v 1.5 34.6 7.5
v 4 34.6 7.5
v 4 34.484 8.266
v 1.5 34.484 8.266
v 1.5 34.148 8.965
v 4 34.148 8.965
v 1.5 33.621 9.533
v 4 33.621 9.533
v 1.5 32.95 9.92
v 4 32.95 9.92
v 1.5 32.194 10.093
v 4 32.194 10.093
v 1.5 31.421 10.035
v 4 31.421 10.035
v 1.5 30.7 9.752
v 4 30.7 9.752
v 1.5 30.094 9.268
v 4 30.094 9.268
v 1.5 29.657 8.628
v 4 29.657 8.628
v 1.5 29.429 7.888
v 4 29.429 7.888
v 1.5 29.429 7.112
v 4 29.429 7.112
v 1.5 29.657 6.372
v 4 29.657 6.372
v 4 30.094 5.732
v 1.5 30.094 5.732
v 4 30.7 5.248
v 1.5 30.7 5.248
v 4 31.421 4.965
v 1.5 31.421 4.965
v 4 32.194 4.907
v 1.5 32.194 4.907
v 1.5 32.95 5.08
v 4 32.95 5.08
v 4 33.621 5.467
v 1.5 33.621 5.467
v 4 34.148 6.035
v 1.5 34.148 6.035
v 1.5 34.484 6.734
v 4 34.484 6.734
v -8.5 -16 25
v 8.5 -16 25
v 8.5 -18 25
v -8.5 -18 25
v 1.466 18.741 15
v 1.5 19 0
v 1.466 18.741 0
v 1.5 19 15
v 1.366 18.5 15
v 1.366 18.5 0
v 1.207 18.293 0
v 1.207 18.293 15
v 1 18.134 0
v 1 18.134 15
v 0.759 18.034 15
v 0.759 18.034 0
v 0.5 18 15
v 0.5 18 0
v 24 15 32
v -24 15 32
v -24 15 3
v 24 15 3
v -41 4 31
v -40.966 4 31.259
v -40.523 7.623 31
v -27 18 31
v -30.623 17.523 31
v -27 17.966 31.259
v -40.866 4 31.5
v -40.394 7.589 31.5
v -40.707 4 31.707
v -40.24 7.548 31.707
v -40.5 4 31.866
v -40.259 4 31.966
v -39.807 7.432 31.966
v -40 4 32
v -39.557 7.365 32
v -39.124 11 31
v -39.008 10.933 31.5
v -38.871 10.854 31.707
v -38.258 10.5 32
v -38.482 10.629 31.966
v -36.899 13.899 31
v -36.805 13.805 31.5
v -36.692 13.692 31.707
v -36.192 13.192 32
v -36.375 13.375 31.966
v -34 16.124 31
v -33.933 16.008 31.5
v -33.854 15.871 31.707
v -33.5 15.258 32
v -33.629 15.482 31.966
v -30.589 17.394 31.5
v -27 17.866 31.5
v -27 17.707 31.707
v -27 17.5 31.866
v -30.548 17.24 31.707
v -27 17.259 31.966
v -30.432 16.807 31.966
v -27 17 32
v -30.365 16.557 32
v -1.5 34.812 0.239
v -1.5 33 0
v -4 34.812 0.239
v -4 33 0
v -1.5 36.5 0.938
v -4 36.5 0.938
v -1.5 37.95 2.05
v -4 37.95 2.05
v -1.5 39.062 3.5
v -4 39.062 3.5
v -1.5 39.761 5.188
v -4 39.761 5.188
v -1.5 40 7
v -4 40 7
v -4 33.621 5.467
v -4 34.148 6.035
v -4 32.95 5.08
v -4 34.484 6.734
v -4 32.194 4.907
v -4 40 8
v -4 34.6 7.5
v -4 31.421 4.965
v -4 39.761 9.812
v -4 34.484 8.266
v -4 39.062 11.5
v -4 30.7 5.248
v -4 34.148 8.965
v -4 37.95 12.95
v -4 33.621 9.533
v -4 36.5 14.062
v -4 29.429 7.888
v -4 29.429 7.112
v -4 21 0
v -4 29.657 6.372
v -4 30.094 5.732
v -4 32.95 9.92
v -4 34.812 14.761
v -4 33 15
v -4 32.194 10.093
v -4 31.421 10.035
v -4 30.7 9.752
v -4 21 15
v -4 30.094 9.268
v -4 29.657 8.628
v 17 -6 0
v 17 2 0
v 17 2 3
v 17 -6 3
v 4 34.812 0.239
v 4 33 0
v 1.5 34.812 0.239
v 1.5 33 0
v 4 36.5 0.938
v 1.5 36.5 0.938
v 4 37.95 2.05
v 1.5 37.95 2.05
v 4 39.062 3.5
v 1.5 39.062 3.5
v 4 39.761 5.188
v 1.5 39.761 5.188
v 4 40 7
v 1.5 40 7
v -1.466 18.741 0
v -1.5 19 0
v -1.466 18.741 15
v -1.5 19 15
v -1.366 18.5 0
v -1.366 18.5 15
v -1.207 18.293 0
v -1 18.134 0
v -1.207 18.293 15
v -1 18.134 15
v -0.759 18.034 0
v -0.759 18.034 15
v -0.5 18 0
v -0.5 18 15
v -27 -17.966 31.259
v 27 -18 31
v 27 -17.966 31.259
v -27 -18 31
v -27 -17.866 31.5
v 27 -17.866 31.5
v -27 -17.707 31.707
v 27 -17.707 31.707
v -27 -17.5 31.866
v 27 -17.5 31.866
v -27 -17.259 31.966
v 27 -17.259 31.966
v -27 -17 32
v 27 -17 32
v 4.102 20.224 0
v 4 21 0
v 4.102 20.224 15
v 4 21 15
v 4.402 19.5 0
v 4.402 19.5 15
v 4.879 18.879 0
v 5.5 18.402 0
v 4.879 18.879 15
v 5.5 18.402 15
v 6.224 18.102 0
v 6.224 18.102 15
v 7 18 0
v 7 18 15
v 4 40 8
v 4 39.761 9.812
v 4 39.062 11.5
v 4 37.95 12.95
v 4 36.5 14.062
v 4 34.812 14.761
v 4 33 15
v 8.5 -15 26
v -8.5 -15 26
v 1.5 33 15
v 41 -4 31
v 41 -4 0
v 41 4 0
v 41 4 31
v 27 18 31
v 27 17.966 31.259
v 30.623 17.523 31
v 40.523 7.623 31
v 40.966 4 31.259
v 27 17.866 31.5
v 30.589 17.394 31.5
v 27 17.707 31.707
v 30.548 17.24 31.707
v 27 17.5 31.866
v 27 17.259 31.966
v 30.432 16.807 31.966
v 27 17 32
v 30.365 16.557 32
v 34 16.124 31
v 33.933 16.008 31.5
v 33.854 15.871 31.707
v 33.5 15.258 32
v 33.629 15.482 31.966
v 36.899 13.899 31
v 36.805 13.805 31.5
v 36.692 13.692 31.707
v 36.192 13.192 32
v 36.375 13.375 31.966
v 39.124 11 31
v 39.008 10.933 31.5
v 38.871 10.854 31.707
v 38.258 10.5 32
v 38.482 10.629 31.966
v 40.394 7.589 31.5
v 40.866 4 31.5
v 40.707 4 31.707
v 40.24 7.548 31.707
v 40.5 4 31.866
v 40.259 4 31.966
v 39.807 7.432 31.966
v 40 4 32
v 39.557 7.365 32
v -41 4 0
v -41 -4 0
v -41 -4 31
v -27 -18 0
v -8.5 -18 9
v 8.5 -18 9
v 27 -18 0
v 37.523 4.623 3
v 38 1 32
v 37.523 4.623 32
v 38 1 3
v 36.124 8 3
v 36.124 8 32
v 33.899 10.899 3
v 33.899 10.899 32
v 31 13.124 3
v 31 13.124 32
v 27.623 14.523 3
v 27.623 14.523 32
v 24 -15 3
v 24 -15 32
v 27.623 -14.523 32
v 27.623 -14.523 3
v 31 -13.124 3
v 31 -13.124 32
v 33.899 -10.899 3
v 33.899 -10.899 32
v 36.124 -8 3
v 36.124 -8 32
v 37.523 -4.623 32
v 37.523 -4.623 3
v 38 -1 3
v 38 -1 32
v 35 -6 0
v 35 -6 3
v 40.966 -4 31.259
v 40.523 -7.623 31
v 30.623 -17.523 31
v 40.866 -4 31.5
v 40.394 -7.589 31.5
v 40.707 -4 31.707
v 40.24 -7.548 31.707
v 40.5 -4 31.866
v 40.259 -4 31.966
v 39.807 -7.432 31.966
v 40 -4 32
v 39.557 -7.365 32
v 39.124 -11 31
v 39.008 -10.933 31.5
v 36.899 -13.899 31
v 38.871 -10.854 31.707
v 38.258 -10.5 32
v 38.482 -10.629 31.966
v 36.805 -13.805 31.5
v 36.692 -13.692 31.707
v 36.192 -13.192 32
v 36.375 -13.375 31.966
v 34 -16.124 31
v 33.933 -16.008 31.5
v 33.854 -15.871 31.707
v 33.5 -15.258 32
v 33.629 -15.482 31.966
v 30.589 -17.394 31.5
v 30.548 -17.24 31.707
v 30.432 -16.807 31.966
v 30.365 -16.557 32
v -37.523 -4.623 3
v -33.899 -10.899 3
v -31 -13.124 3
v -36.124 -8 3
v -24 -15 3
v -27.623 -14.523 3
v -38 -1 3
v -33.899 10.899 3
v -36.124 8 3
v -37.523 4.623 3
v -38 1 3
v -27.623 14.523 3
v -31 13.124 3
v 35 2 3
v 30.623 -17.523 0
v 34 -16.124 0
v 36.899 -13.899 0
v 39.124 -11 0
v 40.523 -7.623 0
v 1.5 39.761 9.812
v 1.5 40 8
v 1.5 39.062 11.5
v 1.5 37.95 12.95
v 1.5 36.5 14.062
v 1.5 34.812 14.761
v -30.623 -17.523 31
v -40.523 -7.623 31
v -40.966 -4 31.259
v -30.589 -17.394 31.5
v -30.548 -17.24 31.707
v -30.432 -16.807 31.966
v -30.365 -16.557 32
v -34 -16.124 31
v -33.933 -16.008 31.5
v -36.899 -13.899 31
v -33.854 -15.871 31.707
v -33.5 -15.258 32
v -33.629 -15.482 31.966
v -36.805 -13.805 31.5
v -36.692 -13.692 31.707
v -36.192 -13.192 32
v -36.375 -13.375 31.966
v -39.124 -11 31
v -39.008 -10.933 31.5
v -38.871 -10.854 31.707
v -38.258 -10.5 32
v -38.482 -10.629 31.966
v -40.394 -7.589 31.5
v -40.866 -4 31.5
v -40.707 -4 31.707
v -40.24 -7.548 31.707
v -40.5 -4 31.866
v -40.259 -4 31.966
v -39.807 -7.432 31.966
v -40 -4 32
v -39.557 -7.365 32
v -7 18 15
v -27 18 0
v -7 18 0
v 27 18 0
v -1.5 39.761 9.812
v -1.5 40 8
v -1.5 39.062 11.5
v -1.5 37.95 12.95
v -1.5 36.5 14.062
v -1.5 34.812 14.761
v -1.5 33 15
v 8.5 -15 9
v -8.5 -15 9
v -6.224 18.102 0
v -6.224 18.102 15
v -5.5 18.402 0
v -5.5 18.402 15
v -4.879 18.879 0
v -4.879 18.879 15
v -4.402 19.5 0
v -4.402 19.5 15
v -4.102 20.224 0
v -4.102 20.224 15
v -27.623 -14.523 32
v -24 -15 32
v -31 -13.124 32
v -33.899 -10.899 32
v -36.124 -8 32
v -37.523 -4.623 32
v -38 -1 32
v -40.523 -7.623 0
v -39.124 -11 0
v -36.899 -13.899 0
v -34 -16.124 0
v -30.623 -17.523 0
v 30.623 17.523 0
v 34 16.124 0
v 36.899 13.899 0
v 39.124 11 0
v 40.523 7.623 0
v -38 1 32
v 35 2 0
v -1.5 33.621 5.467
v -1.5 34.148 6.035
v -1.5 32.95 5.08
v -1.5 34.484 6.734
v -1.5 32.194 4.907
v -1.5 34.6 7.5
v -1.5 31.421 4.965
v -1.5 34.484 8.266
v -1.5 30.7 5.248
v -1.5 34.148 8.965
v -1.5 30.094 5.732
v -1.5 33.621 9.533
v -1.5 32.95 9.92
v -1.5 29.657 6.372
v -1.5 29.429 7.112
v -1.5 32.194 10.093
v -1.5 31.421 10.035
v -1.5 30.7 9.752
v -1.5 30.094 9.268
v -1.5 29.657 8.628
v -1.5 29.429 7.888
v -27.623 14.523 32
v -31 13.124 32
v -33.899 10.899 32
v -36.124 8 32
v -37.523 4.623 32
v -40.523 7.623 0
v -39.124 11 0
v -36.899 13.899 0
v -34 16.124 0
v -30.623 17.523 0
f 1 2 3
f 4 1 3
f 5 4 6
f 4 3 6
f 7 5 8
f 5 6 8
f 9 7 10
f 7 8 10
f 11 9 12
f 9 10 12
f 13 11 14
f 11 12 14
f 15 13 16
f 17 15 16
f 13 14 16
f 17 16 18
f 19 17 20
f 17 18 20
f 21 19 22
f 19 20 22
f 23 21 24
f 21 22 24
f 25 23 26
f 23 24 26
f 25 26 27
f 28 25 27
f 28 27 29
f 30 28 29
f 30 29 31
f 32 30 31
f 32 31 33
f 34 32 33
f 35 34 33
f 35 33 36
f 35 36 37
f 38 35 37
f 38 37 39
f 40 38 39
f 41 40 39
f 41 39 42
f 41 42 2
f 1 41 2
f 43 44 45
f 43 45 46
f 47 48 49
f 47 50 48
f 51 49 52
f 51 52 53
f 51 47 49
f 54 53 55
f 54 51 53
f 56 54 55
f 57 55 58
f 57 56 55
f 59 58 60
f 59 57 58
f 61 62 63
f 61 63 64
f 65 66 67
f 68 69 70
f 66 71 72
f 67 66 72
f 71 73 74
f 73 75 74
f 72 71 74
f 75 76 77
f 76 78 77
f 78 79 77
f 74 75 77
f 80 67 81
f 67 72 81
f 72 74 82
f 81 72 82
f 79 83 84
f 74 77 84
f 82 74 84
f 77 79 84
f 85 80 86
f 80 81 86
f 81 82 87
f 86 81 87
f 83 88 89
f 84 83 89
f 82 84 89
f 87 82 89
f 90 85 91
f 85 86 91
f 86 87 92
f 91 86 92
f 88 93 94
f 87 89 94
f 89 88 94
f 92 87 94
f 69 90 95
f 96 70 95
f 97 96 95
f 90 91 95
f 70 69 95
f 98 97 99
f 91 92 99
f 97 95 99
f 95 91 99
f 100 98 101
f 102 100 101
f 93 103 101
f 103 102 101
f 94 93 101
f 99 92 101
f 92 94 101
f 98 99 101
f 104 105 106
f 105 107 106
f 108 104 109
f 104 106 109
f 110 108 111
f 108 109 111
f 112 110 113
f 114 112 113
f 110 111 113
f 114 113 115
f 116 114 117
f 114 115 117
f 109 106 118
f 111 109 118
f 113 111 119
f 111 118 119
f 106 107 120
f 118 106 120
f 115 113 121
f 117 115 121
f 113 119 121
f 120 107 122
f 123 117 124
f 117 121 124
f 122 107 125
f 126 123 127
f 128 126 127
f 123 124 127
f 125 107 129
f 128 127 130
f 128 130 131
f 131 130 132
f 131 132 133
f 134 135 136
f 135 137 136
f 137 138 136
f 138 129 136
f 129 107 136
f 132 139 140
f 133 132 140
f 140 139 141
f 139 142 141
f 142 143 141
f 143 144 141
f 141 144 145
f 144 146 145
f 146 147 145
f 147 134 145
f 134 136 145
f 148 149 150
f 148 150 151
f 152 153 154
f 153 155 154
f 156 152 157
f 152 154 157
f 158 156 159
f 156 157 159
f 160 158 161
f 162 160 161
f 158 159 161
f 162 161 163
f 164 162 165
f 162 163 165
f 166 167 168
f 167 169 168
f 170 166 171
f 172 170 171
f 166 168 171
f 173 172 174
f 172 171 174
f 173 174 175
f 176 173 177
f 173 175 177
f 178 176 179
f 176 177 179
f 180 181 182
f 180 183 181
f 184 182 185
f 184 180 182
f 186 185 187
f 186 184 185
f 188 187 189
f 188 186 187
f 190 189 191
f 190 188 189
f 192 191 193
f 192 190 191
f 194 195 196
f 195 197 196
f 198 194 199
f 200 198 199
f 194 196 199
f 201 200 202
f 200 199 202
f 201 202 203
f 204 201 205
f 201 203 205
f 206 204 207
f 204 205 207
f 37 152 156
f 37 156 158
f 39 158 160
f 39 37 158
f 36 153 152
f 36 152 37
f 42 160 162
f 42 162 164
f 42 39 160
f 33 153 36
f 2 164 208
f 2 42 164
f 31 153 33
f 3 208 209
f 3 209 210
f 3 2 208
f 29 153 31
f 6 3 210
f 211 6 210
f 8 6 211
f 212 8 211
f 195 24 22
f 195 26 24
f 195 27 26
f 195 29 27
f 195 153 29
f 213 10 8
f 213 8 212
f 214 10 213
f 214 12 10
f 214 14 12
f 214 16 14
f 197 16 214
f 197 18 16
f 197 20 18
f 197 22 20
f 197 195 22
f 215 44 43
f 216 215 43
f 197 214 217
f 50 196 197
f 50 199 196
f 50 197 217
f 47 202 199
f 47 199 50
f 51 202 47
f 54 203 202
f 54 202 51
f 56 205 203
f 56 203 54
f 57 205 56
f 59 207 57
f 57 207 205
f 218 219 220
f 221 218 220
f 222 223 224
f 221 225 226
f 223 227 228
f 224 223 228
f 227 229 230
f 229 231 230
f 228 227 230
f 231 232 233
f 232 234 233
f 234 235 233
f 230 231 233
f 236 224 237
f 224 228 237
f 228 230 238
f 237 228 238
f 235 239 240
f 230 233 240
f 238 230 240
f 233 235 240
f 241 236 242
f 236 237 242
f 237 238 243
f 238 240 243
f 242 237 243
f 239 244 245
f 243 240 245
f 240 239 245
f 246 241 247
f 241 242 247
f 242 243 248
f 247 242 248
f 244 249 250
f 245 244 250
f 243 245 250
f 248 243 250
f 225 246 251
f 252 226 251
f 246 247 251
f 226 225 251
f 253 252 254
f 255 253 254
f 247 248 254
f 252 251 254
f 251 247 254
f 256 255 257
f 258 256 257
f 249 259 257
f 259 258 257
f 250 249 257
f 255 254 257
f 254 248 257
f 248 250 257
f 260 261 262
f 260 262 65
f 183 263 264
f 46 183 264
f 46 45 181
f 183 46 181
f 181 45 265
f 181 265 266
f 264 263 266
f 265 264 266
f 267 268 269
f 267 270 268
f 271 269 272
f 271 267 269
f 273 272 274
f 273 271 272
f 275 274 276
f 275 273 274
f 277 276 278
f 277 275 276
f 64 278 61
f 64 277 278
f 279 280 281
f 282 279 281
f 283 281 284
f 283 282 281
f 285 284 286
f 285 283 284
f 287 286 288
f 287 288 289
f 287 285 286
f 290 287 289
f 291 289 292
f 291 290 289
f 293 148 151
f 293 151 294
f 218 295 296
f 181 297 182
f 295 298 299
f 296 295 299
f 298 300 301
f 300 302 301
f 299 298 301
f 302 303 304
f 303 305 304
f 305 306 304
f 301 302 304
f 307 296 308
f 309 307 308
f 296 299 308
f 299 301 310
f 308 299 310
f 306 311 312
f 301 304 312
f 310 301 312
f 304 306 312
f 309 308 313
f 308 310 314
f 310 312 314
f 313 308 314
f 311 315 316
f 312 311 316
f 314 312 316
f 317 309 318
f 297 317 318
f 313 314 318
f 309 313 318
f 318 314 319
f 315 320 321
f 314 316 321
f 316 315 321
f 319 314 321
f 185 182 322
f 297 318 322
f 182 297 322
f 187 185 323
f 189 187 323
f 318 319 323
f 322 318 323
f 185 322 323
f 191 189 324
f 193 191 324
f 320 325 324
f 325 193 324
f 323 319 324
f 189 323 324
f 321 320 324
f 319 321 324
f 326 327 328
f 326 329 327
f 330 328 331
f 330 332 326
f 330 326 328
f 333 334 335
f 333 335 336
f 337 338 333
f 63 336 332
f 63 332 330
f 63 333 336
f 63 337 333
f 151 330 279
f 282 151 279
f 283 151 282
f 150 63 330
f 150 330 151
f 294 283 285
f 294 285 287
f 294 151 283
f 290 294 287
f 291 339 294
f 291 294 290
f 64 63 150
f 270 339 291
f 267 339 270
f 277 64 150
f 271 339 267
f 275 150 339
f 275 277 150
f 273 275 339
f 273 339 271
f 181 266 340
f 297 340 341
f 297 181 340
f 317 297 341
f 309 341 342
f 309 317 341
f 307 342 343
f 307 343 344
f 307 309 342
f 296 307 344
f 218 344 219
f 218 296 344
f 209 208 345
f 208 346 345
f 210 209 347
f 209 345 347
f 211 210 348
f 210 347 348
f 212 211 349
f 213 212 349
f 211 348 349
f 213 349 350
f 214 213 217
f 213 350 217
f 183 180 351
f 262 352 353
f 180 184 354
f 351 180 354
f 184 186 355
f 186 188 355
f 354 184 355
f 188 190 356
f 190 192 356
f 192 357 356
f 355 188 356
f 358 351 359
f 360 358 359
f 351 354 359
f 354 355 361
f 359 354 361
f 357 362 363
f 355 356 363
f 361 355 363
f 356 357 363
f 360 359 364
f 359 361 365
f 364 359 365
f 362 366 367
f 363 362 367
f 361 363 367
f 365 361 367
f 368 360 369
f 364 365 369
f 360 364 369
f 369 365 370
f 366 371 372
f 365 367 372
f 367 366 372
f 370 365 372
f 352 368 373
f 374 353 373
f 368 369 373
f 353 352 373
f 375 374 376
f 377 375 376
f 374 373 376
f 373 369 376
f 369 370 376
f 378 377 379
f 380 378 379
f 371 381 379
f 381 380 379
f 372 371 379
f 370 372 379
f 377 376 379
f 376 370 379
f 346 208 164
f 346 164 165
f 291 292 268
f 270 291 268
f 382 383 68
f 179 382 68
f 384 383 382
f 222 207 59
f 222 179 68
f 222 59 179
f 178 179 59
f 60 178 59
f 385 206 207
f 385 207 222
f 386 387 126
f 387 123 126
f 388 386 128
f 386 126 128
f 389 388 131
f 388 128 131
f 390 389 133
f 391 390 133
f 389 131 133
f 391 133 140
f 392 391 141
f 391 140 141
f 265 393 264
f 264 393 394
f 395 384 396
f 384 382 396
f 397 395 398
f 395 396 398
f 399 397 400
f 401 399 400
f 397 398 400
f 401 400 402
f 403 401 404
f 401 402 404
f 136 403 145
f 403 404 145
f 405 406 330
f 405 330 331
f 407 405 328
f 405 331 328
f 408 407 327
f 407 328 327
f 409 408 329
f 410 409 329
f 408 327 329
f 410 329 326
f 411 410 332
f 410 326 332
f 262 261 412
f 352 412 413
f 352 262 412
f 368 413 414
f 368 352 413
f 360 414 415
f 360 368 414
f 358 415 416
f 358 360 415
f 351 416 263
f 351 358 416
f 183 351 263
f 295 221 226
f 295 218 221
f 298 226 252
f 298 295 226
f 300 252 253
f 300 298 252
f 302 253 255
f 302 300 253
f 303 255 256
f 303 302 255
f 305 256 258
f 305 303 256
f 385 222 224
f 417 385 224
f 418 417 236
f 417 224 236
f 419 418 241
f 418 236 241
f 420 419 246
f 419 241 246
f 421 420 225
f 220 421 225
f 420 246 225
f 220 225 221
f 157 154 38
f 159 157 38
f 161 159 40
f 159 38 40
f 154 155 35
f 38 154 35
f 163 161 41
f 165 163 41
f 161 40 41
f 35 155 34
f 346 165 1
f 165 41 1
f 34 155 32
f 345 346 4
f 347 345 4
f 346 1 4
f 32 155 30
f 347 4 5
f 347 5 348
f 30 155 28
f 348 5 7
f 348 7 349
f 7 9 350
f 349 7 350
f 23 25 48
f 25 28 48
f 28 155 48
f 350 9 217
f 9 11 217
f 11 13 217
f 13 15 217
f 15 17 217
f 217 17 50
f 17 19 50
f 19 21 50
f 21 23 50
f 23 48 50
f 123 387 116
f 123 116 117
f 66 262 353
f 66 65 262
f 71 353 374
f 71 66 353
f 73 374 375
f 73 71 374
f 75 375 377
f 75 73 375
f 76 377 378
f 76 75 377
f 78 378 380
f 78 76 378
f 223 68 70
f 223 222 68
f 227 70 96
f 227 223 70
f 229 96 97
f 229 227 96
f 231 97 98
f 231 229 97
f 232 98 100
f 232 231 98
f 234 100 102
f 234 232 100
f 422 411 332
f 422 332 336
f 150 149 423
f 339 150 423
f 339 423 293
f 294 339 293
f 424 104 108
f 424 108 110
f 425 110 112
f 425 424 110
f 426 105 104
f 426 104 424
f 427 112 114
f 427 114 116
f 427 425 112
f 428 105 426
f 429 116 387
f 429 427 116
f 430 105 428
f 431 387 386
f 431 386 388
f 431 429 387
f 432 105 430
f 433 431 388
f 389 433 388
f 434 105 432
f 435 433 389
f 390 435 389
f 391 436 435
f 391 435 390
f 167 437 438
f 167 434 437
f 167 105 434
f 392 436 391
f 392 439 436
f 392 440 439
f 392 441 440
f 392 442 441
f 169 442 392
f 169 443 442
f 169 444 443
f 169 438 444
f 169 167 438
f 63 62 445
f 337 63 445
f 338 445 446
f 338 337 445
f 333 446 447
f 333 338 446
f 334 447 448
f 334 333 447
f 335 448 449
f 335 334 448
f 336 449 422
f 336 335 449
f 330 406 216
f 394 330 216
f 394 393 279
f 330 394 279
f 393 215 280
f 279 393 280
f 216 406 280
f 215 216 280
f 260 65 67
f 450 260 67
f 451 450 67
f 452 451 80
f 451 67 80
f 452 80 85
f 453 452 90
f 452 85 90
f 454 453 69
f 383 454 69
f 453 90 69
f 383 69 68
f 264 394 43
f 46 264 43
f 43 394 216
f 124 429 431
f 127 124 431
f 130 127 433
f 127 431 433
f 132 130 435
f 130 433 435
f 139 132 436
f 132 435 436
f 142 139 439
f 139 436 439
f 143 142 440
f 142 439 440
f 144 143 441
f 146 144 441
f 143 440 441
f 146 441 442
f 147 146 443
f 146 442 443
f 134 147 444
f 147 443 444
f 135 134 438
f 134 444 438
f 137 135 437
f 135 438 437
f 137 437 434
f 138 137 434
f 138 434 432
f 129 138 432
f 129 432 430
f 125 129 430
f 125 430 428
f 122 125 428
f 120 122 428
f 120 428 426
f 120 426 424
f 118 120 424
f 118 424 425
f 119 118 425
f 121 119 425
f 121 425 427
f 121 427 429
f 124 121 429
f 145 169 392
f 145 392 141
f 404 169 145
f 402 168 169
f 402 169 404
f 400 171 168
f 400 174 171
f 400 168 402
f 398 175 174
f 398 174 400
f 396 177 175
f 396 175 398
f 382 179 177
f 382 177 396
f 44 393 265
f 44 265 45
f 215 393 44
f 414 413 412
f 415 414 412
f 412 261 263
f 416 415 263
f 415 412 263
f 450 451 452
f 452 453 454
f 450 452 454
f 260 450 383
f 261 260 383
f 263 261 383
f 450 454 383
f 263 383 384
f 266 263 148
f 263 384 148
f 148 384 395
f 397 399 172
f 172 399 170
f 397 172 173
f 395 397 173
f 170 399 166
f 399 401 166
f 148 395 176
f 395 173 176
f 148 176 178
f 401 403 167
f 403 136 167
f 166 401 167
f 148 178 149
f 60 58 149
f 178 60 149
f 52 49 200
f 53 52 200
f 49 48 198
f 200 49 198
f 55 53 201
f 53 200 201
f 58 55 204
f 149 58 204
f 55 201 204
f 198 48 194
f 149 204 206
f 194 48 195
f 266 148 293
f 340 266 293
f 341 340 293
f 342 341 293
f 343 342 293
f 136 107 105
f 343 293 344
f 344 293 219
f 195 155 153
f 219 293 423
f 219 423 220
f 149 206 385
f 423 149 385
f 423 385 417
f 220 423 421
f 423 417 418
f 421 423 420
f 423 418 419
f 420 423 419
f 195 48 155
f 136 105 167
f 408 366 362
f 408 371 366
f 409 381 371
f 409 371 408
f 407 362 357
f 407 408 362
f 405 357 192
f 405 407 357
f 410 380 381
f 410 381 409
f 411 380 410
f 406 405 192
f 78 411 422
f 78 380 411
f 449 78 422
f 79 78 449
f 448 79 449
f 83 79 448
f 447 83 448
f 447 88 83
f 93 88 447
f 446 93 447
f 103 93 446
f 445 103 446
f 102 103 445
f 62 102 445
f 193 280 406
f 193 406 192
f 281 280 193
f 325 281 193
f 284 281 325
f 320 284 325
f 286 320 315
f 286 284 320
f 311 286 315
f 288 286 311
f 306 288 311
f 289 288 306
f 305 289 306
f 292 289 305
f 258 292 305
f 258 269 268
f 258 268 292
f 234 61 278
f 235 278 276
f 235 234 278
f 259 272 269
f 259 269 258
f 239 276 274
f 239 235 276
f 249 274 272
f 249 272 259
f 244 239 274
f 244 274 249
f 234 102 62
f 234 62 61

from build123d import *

# Parameters (mm, degrees)
SKETCH_W        = 82
SKETCH_H        = 36
PAD_DEPTH       = 32
SKETCH001_W     = 76
SKETCH001_H     = 30
POCKET_DEPTH    = 29
FILLET_R        = 14
SKETCH002_W     = 17
SKETCH002_H     = 16
POCKET001_DEPTH = 8
SKETCH003_W     = 18
SKETCH003_H     = 8
POCKET002_DEPTH = 5
SKETCH004_W     = 2.5
SKETCH004_H     = 15
PAD001_DEPTH    = 22
SKETCH005_R     = 2.6
POCKET003_DEPTH = 12
FILLET001_R     = 1
FILLET002_R     = 7
FILLET003_R     = 3
FILLET004_R     = 1
CHAMFER_SIZE    = 1


with BuildPart() as part:
    # Sketch → Pad (new body)
    with BuildSketch(Plane.XY):
        Rectangle(SKETCH_W, SKETCH_H)
    extrude(amount=PAD_DEPTH)

    # Sketch001 (on Face6 of Pad) → Pocket (cut)
    with BuildSketch(Plane.XY.offset(32)):
        Rectangle(SKETCH001_W, SKETCH001_H)
    extrude(amount=-POCKET_DEPTH, mode=Mode.SUBTRACT)

    # Fillet
    fillet_edges = [part.edges().sort_by_distance(p)[0] for p in [
        (-41, 18, 16),
        (-38, 15, 17.5),
        (-41, -18, 16),
        (-38, -15, 17.5),
        (41, 18, 16),
        (38, 15, 17.5),
        (41, -18, 16),
        (38, -15, 17.5),
    ]]
    fillet(fillet_edges, radius=FILLET_R)

    # Sketch002 → Pocket001 (cut)
    with BuildSketch(Plane(origin=(0, -15, 0), x_dir=(-1, 0, 0), z_dir=(0, 1, 0))):
        with Locations((0, 17)):
            Rectangle(SKETCH002_W, SKETCH002_H)
    extrude(amount=-POCKET001_DEPTH, mode=Mode.SUBTRACT)

    # Sketch003 (on Face2 of Pocket001) → Pocket002 (cut)
    with BuildSketch(Plane(origin=(0, 0, 0), x_dir=(1, 0, 0), z_dir=(0, 0, -1))):
        with Locations((26, 2)):
            Rectangle(SKETCH003_W, SKETCH003_H)
    extrude(amount=-POCKET002_DEPTH, mode=Mode.SUBTRACT)

    # Sketch004 (on Face1 of Pocket002) → Pad001 (join)
    with BuildSketch(Plane(origin=(0, 18, 0), x_dir=(-1, 0, 0), z_dir=(0, 1, 0))):
        with Locations((2.75, 7.5)):
            Rectangle(SKETCH004_W, SKETCH004_H)
        with Locations((-2.75, 7.5)):
            Rectangle(SKETCH004_W, SKETCH004_H)
    extrude(amount=PAD001_DEPTH)

    # Sketch005 (on Face8 of Pad001) → Pocket003 (cut)
    with BuildSketch(Plane.YZ.offset(4)):
        with Locations((32, 7.5)):
            Circle(SKETCH005_R)
    extrude(amount=-POCKET003_DEPTH, mode=Mode.SUBTRACT)

    # Fillet001
    fillet001_edges = [part.edges().sort_by_distance(p)[0] for p in [
        (-36.899495, 13.899495, 32),
        (-41, 0, 32),
        (-36.899495, -13.899495, 32),
        (0, -18, 32),
        (36.899495, -13.899495, 32),
        (41, 0, 32),
        (36.899495, 13.899495, 32),
        (0, 18, 32),
    ]]
    fillet(fillet001_edges, radius=FILLET001_R)

    # Fillet002
    fillet002_edges = [part.edges().sort_by_distance(p)[0] for p in [
        (-2.75, 40, 15),
        (2.75, 40, 15),
        (-2.75, 40, 0),
        (2.75, 40, 0),
    ]]
    fillet(fillet002_edges, radius=FILLET002_R)

    # Fillet003
    fillet003_edges = [part.edges().sort_by_distance(p)[0] for p in [
        (4, 18, 7.5),
        (-4, 18, 7.5),
    ]]
    fillet(fillet003_edges, radius=FILLET003_R)

    # Fillet004
    fillet004_edges = [part.edges().sort_by_distance(p)[0] for p in [
        (-1.5, 18, 7.5),
        (1.5, 18, 7.5),
    ]]
    fillet(fillet004_edges, radius=FILLET004_R)

    # Chamfer
    chamfer_edges = [part.edges().sort_by_distance(p)[0] for p in [
        (0, -15, 25),
    ]]
    chamfer(chamfer_edges, length=CHAMFER_SIZE)


solid = part.part
